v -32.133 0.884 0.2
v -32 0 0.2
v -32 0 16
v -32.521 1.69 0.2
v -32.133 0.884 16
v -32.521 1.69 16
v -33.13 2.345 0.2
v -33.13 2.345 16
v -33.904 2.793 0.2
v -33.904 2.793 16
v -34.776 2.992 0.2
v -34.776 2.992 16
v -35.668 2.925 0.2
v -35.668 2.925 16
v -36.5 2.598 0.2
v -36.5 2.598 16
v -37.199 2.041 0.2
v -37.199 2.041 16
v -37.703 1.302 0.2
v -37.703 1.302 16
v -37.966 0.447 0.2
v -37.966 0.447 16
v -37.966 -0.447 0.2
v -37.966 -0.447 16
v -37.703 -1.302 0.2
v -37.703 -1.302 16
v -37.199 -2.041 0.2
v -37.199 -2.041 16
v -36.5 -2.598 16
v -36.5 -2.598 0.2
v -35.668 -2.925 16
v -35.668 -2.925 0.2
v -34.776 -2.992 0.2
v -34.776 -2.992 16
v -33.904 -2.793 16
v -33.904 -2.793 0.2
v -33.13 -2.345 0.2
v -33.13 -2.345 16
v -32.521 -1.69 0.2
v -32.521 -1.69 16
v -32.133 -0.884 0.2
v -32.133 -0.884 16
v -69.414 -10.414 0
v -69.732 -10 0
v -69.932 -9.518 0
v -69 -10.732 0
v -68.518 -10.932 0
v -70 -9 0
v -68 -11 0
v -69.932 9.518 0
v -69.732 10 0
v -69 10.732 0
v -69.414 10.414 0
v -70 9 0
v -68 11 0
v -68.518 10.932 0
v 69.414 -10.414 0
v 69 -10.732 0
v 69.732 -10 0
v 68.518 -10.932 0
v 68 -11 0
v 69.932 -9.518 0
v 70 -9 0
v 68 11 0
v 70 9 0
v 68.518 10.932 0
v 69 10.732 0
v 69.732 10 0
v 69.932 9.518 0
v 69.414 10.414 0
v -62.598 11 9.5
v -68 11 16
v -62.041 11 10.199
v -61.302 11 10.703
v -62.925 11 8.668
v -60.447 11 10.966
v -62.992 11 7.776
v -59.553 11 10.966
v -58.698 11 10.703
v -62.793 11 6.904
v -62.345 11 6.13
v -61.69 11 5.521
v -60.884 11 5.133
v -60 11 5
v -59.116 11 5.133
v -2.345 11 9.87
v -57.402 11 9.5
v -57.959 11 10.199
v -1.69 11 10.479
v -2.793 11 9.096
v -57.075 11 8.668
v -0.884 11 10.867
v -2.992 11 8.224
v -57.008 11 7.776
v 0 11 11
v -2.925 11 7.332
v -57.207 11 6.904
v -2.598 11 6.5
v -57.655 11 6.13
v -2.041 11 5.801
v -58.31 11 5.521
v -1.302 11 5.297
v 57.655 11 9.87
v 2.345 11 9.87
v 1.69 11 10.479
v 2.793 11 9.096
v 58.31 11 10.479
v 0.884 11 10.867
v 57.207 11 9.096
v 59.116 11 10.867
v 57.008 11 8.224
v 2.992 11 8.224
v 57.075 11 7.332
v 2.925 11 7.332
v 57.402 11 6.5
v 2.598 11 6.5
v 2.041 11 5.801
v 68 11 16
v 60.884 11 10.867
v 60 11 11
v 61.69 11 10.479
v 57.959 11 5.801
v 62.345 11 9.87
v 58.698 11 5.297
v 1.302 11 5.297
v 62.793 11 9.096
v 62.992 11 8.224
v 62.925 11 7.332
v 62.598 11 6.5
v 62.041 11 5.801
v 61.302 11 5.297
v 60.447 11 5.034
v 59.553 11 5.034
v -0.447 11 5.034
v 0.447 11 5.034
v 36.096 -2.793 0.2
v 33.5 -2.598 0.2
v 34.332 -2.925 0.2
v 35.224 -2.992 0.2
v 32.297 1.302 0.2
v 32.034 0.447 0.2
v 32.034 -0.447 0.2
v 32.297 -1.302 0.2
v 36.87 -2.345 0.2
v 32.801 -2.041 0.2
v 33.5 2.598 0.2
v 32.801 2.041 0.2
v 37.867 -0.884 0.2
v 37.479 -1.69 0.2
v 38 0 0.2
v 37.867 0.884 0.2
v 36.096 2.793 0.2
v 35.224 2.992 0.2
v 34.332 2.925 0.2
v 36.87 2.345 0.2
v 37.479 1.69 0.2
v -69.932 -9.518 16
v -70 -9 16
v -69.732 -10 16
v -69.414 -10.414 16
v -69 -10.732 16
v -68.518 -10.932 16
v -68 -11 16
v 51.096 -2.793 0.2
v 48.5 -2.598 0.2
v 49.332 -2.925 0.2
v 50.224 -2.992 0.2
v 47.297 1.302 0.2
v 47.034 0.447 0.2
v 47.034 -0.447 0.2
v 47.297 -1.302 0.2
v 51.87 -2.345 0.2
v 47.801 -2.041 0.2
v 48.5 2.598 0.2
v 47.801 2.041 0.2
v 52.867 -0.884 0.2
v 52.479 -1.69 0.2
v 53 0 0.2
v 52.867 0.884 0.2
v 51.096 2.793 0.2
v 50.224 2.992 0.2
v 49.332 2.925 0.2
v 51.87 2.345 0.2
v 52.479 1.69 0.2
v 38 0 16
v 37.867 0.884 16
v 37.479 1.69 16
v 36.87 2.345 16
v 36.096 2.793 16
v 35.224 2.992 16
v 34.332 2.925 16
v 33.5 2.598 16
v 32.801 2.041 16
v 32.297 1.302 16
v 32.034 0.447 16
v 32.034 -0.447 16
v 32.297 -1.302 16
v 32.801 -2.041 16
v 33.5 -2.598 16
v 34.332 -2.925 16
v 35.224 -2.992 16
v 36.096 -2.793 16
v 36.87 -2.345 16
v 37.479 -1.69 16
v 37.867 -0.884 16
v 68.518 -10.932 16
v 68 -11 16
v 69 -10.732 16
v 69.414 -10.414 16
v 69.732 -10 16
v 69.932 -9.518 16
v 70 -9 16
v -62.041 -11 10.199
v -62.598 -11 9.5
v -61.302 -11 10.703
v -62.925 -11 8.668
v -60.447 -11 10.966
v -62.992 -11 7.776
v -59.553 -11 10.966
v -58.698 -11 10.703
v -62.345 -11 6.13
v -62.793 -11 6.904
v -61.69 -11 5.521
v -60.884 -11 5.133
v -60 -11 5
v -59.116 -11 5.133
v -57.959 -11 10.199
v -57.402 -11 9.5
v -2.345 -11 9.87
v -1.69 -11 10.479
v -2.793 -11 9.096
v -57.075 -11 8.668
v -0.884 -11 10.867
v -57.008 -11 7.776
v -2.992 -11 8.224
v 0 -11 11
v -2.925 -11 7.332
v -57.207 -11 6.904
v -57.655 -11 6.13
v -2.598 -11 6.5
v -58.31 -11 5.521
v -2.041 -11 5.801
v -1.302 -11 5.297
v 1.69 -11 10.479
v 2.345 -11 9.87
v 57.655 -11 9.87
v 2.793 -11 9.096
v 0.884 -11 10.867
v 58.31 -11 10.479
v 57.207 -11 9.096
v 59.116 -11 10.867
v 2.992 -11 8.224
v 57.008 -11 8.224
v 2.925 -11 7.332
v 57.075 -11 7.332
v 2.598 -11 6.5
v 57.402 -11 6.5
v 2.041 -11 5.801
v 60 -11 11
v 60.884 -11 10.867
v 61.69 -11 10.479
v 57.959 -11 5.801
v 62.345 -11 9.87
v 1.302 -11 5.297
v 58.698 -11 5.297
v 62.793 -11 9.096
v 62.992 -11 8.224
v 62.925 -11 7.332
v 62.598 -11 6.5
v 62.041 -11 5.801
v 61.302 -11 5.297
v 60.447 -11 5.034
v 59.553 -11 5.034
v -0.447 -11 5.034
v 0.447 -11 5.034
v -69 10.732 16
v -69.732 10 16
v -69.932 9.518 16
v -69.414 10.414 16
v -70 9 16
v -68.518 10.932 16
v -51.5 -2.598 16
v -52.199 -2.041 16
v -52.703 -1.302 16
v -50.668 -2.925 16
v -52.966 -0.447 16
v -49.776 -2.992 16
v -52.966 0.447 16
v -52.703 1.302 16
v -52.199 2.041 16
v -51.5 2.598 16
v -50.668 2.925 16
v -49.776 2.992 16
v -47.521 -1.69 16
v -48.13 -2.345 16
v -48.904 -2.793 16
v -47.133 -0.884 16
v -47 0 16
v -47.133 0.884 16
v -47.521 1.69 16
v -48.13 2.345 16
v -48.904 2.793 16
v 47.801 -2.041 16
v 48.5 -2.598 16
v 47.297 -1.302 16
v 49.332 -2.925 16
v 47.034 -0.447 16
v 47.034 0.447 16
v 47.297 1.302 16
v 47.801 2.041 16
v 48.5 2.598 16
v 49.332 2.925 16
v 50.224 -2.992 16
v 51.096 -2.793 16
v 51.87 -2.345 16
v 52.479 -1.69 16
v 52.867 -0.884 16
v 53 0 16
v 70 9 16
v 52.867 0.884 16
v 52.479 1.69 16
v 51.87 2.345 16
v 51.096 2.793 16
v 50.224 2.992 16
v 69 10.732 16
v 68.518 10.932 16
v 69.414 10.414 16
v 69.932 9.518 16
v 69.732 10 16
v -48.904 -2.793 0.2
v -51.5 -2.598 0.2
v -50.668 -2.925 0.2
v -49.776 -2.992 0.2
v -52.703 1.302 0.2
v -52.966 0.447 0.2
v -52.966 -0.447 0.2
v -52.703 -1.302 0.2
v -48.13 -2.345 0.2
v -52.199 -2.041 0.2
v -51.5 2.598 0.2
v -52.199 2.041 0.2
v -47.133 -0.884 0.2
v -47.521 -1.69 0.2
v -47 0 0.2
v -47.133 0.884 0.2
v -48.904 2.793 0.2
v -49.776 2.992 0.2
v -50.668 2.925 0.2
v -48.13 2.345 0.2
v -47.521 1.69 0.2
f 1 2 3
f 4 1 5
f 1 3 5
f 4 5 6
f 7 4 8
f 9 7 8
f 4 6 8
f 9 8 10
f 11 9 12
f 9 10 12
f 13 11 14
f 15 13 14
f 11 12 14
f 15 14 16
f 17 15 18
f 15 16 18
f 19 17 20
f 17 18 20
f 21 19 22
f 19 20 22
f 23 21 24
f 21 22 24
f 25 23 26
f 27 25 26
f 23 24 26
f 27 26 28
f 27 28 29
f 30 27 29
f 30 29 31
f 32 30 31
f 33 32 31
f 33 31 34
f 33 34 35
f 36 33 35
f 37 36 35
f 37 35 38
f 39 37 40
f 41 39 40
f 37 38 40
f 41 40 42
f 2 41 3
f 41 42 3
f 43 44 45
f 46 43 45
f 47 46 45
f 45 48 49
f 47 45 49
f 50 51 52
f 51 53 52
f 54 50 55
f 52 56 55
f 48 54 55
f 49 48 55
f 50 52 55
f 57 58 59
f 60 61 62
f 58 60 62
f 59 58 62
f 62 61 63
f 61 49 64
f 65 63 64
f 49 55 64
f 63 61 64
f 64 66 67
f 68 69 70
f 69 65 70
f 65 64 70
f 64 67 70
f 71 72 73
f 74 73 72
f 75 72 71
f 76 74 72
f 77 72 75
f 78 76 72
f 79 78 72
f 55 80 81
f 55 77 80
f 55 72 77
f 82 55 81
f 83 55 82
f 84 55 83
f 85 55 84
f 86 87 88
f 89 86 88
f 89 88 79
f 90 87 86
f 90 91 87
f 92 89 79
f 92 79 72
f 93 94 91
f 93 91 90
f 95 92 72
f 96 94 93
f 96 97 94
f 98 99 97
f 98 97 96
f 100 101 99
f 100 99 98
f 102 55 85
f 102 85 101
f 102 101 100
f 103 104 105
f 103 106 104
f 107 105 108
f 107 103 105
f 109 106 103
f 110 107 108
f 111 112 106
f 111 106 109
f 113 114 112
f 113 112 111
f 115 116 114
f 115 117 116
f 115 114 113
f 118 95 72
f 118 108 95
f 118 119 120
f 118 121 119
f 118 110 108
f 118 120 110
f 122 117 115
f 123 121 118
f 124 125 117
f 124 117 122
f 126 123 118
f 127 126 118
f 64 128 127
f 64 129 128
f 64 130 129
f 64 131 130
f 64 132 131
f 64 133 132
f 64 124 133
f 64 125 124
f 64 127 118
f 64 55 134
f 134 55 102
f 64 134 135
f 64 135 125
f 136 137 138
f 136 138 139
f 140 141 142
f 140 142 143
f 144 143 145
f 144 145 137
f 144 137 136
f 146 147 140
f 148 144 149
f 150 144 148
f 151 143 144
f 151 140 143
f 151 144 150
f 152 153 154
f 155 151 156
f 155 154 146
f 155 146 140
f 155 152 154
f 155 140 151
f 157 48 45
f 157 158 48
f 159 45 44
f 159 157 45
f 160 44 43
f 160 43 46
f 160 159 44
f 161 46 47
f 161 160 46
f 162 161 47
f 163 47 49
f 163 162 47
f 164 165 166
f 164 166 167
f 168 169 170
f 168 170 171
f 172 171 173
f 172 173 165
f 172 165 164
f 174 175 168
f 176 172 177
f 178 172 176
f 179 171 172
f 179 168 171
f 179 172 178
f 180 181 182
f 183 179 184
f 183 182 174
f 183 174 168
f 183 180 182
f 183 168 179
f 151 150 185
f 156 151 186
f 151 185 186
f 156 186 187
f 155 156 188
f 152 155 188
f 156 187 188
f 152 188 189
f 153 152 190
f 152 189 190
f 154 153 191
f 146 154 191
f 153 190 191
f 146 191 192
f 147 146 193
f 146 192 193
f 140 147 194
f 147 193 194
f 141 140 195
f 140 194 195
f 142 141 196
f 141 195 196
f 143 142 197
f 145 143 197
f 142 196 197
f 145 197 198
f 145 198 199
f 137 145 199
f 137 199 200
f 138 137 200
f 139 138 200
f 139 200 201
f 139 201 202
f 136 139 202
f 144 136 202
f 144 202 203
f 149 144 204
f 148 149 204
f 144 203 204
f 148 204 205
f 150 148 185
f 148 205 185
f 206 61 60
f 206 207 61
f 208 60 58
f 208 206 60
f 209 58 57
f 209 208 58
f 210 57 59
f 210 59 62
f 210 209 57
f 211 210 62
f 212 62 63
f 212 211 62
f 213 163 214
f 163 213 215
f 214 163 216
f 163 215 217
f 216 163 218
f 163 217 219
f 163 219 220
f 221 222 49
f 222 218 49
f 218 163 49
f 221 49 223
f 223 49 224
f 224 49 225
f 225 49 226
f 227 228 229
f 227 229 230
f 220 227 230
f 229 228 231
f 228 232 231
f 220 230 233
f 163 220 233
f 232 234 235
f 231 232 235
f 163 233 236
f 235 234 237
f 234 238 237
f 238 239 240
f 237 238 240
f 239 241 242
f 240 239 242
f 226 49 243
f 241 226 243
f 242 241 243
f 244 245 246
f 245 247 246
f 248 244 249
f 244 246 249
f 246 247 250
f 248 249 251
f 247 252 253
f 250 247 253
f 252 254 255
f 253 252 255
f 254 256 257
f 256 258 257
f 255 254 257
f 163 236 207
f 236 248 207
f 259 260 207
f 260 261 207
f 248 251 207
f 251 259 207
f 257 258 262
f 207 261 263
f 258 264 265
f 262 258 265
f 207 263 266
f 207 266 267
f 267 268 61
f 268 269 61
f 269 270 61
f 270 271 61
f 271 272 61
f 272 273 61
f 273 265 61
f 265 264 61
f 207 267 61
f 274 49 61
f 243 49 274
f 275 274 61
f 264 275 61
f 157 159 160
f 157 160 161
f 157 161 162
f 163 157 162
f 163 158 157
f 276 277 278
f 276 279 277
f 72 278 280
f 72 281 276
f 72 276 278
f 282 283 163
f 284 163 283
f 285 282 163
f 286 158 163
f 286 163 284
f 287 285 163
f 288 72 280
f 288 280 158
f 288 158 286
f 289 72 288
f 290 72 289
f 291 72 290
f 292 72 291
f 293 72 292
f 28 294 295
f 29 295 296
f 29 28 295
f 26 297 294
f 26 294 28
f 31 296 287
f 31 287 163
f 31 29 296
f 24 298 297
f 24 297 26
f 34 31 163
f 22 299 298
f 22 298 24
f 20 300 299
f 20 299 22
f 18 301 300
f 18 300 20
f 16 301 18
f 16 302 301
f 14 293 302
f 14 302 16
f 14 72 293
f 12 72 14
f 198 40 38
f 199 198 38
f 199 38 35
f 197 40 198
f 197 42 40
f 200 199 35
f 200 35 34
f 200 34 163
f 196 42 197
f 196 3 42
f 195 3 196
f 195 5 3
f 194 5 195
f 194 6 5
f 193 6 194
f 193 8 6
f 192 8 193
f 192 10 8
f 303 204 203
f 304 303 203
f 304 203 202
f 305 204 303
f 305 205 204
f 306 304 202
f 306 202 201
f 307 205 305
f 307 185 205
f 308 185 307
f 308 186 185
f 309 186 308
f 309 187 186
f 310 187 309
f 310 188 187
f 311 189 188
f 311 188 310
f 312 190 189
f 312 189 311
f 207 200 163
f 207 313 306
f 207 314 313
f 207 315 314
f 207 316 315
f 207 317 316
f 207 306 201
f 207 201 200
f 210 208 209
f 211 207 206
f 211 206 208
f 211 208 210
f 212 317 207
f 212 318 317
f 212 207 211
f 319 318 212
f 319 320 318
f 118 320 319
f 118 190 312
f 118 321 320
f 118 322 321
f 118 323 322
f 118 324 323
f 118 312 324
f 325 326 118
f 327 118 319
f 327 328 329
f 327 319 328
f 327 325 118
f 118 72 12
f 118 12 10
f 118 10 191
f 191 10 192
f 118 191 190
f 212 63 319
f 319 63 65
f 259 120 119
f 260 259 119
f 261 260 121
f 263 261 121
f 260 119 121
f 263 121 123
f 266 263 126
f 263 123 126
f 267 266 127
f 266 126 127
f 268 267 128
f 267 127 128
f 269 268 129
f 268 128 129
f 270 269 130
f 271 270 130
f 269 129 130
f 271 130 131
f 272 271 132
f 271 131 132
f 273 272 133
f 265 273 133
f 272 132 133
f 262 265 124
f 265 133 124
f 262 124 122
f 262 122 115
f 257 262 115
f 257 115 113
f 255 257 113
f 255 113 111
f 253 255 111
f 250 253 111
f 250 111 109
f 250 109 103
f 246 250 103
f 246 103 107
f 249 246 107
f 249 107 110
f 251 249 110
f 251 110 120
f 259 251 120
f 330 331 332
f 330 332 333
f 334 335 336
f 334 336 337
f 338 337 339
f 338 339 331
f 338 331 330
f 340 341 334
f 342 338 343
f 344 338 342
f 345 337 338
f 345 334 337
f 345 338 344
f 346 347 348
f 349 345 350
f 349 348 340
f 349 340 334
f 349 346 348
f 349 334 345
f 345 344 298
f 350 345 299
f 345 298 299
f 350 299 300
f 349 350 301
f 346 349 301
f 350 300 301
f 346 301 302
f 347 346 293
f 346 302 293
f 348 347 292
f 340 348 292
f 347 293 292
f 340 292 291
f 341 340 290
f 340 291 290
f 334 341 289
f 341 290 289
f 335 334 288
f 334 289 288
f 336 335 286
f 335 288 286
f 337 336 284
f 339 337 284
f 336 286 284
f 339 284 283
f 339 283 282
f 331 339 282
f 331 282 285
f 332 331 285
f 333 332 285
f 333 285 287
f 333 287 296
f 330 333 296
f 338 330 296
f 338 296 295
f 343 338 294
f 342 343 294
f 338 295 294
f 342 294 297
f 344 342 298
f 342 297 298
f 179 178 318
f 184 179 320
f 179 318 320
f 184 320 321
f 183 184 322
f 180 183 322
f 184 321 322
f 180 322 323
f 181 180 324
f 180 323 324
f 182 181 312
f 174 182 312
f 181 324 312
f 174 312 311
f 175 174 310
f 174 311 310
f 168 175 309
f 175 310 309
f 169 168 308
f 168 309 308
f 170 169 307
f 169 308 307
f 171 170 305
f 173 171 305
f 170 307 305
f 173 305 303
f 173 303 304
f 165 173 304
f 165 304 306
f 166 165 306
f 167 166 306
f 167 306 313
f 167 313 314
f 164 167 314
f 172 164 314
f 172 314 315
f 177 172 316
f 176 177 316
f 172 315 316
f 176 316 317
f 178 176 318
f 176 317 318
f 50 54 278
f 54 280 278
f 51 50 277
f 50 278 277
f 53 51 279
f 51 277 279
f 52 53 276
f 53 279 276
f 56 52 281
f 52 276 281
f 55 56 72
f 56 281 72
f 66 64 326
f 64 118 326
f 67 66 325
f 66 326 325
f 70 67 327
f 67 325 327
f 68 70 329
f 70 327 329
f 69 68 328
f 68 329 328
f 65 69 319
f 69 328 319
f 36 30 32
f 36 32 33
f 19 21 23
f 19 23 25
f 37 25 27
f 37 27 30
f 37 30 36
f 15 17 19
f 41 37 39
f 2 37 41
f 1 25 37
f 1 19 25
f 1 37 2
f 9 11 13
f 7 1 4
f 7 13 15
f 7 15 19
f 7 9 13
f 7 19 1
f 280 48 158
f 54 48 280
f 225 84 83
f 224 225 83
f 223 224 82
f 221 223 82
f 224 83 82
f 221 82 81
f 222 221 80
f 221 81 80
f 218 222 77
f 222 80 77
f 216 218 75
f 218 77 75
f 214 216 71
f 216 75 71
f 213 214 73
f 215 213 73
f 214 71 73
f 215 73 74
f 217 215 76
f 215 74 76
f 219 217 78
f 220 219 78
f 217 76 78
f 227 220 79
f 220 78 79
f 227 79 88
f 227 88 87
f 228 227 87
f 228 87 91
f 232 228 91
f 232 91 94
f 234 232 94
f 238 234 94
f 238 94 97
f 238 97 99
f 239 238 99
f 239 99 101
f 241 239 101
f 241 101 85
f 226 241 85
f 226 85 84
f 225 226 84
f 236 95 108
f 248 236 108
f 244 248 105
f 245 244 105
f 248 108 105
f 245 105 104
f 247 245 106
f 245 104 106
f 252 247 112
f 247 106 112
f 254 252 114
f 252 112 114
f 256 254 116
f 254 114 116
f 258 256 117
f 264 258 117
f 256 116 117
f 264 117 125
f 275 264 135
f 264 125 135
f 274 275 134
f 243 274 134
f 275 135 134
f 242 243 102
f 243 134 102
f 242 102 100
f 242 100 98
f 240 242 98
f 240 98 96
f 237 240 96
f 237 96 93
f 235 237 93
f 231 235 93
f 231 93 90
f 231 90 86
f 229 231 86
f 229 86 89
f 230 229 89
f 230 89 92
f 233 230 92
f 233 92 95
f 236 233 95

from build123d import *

# Parameters (mm, degrees)
SKETCH1_W           = 140
SKETCH1_H           = 22
BOSS_EXTRUDE1_DEPTH = 16
SKETCH2_R           = 3
HOLES_DEPTH         = 15.8
SKETCH3_R           = 3
CUT_EXTRUDE2_DEPTH  = 76.099933422
FILLET2_R           = 2
FILLET4_R           = 2


with BuildPart() as part:
    # Sketch1 → Boss-Extrude1 (new body)
    with BuildSketch(Plane.XY):
        Rectangle(SKETCH1_W, SKETCH1_H)
    extrude(amount=BOSS_EXTRUDE1_DEPTH)

    # Sketch2 → holes (cut)
    with BuildSketch(Plane.XY.offset(16)):
        with Locations((35, 0)):
            Circle(SKETCH2_R)
        with Locations((50, 0)):
            Circle(SKETCH2_R)
        with Locations((-35, 0)):
            Circle(SKETCH2_R)
        with Locations((-50, 0)):
            Circle(SKETCH2_R)
    extrude(amount=-HOLES_DEPTH, mode=Mode.SUBTRACT)

    # Sketch3 → Cut-Extrude2 (cut, through all)
    with BuildSketch(Plane(origin=(0, 11, 0), x_dir=(1, 0, 0), z_dir=(0, 1, 0))):
        with Locations(Location((0, -8, 0), (0, 0, 270))):
            Circle(SKETCH3_R)
        with Locations(Location((60, -8, 0), (0, 0, 270))):
            Circle(SKETCH3_R)
        with Locations(Location((-60, -8, 0), (0, 0, 90))):
            Circle(SKETCH3_R)
    extrude(amount=-CUT_EXTRUDE2_DEPTH, mode=Mode.SUBTRACT)

    # Fillet2
    fillet2_edges = [part.edges().sort_by_distance(p)[0] for p in [
        (-70, -11, 8),
        (-70, 11, 8),
    ]]
    fillet(fillet2_edges, radius=FILLET2_R)

    # Fillet4
    fillet4_edges = [part.edges().sort_by_distance(p)[0] for p in [
        (70, -11, 8),
        (70, 11, 8),
    ]]
    fillet(fillet4_edges, radius=FILLET4_R)


solid = part.part
